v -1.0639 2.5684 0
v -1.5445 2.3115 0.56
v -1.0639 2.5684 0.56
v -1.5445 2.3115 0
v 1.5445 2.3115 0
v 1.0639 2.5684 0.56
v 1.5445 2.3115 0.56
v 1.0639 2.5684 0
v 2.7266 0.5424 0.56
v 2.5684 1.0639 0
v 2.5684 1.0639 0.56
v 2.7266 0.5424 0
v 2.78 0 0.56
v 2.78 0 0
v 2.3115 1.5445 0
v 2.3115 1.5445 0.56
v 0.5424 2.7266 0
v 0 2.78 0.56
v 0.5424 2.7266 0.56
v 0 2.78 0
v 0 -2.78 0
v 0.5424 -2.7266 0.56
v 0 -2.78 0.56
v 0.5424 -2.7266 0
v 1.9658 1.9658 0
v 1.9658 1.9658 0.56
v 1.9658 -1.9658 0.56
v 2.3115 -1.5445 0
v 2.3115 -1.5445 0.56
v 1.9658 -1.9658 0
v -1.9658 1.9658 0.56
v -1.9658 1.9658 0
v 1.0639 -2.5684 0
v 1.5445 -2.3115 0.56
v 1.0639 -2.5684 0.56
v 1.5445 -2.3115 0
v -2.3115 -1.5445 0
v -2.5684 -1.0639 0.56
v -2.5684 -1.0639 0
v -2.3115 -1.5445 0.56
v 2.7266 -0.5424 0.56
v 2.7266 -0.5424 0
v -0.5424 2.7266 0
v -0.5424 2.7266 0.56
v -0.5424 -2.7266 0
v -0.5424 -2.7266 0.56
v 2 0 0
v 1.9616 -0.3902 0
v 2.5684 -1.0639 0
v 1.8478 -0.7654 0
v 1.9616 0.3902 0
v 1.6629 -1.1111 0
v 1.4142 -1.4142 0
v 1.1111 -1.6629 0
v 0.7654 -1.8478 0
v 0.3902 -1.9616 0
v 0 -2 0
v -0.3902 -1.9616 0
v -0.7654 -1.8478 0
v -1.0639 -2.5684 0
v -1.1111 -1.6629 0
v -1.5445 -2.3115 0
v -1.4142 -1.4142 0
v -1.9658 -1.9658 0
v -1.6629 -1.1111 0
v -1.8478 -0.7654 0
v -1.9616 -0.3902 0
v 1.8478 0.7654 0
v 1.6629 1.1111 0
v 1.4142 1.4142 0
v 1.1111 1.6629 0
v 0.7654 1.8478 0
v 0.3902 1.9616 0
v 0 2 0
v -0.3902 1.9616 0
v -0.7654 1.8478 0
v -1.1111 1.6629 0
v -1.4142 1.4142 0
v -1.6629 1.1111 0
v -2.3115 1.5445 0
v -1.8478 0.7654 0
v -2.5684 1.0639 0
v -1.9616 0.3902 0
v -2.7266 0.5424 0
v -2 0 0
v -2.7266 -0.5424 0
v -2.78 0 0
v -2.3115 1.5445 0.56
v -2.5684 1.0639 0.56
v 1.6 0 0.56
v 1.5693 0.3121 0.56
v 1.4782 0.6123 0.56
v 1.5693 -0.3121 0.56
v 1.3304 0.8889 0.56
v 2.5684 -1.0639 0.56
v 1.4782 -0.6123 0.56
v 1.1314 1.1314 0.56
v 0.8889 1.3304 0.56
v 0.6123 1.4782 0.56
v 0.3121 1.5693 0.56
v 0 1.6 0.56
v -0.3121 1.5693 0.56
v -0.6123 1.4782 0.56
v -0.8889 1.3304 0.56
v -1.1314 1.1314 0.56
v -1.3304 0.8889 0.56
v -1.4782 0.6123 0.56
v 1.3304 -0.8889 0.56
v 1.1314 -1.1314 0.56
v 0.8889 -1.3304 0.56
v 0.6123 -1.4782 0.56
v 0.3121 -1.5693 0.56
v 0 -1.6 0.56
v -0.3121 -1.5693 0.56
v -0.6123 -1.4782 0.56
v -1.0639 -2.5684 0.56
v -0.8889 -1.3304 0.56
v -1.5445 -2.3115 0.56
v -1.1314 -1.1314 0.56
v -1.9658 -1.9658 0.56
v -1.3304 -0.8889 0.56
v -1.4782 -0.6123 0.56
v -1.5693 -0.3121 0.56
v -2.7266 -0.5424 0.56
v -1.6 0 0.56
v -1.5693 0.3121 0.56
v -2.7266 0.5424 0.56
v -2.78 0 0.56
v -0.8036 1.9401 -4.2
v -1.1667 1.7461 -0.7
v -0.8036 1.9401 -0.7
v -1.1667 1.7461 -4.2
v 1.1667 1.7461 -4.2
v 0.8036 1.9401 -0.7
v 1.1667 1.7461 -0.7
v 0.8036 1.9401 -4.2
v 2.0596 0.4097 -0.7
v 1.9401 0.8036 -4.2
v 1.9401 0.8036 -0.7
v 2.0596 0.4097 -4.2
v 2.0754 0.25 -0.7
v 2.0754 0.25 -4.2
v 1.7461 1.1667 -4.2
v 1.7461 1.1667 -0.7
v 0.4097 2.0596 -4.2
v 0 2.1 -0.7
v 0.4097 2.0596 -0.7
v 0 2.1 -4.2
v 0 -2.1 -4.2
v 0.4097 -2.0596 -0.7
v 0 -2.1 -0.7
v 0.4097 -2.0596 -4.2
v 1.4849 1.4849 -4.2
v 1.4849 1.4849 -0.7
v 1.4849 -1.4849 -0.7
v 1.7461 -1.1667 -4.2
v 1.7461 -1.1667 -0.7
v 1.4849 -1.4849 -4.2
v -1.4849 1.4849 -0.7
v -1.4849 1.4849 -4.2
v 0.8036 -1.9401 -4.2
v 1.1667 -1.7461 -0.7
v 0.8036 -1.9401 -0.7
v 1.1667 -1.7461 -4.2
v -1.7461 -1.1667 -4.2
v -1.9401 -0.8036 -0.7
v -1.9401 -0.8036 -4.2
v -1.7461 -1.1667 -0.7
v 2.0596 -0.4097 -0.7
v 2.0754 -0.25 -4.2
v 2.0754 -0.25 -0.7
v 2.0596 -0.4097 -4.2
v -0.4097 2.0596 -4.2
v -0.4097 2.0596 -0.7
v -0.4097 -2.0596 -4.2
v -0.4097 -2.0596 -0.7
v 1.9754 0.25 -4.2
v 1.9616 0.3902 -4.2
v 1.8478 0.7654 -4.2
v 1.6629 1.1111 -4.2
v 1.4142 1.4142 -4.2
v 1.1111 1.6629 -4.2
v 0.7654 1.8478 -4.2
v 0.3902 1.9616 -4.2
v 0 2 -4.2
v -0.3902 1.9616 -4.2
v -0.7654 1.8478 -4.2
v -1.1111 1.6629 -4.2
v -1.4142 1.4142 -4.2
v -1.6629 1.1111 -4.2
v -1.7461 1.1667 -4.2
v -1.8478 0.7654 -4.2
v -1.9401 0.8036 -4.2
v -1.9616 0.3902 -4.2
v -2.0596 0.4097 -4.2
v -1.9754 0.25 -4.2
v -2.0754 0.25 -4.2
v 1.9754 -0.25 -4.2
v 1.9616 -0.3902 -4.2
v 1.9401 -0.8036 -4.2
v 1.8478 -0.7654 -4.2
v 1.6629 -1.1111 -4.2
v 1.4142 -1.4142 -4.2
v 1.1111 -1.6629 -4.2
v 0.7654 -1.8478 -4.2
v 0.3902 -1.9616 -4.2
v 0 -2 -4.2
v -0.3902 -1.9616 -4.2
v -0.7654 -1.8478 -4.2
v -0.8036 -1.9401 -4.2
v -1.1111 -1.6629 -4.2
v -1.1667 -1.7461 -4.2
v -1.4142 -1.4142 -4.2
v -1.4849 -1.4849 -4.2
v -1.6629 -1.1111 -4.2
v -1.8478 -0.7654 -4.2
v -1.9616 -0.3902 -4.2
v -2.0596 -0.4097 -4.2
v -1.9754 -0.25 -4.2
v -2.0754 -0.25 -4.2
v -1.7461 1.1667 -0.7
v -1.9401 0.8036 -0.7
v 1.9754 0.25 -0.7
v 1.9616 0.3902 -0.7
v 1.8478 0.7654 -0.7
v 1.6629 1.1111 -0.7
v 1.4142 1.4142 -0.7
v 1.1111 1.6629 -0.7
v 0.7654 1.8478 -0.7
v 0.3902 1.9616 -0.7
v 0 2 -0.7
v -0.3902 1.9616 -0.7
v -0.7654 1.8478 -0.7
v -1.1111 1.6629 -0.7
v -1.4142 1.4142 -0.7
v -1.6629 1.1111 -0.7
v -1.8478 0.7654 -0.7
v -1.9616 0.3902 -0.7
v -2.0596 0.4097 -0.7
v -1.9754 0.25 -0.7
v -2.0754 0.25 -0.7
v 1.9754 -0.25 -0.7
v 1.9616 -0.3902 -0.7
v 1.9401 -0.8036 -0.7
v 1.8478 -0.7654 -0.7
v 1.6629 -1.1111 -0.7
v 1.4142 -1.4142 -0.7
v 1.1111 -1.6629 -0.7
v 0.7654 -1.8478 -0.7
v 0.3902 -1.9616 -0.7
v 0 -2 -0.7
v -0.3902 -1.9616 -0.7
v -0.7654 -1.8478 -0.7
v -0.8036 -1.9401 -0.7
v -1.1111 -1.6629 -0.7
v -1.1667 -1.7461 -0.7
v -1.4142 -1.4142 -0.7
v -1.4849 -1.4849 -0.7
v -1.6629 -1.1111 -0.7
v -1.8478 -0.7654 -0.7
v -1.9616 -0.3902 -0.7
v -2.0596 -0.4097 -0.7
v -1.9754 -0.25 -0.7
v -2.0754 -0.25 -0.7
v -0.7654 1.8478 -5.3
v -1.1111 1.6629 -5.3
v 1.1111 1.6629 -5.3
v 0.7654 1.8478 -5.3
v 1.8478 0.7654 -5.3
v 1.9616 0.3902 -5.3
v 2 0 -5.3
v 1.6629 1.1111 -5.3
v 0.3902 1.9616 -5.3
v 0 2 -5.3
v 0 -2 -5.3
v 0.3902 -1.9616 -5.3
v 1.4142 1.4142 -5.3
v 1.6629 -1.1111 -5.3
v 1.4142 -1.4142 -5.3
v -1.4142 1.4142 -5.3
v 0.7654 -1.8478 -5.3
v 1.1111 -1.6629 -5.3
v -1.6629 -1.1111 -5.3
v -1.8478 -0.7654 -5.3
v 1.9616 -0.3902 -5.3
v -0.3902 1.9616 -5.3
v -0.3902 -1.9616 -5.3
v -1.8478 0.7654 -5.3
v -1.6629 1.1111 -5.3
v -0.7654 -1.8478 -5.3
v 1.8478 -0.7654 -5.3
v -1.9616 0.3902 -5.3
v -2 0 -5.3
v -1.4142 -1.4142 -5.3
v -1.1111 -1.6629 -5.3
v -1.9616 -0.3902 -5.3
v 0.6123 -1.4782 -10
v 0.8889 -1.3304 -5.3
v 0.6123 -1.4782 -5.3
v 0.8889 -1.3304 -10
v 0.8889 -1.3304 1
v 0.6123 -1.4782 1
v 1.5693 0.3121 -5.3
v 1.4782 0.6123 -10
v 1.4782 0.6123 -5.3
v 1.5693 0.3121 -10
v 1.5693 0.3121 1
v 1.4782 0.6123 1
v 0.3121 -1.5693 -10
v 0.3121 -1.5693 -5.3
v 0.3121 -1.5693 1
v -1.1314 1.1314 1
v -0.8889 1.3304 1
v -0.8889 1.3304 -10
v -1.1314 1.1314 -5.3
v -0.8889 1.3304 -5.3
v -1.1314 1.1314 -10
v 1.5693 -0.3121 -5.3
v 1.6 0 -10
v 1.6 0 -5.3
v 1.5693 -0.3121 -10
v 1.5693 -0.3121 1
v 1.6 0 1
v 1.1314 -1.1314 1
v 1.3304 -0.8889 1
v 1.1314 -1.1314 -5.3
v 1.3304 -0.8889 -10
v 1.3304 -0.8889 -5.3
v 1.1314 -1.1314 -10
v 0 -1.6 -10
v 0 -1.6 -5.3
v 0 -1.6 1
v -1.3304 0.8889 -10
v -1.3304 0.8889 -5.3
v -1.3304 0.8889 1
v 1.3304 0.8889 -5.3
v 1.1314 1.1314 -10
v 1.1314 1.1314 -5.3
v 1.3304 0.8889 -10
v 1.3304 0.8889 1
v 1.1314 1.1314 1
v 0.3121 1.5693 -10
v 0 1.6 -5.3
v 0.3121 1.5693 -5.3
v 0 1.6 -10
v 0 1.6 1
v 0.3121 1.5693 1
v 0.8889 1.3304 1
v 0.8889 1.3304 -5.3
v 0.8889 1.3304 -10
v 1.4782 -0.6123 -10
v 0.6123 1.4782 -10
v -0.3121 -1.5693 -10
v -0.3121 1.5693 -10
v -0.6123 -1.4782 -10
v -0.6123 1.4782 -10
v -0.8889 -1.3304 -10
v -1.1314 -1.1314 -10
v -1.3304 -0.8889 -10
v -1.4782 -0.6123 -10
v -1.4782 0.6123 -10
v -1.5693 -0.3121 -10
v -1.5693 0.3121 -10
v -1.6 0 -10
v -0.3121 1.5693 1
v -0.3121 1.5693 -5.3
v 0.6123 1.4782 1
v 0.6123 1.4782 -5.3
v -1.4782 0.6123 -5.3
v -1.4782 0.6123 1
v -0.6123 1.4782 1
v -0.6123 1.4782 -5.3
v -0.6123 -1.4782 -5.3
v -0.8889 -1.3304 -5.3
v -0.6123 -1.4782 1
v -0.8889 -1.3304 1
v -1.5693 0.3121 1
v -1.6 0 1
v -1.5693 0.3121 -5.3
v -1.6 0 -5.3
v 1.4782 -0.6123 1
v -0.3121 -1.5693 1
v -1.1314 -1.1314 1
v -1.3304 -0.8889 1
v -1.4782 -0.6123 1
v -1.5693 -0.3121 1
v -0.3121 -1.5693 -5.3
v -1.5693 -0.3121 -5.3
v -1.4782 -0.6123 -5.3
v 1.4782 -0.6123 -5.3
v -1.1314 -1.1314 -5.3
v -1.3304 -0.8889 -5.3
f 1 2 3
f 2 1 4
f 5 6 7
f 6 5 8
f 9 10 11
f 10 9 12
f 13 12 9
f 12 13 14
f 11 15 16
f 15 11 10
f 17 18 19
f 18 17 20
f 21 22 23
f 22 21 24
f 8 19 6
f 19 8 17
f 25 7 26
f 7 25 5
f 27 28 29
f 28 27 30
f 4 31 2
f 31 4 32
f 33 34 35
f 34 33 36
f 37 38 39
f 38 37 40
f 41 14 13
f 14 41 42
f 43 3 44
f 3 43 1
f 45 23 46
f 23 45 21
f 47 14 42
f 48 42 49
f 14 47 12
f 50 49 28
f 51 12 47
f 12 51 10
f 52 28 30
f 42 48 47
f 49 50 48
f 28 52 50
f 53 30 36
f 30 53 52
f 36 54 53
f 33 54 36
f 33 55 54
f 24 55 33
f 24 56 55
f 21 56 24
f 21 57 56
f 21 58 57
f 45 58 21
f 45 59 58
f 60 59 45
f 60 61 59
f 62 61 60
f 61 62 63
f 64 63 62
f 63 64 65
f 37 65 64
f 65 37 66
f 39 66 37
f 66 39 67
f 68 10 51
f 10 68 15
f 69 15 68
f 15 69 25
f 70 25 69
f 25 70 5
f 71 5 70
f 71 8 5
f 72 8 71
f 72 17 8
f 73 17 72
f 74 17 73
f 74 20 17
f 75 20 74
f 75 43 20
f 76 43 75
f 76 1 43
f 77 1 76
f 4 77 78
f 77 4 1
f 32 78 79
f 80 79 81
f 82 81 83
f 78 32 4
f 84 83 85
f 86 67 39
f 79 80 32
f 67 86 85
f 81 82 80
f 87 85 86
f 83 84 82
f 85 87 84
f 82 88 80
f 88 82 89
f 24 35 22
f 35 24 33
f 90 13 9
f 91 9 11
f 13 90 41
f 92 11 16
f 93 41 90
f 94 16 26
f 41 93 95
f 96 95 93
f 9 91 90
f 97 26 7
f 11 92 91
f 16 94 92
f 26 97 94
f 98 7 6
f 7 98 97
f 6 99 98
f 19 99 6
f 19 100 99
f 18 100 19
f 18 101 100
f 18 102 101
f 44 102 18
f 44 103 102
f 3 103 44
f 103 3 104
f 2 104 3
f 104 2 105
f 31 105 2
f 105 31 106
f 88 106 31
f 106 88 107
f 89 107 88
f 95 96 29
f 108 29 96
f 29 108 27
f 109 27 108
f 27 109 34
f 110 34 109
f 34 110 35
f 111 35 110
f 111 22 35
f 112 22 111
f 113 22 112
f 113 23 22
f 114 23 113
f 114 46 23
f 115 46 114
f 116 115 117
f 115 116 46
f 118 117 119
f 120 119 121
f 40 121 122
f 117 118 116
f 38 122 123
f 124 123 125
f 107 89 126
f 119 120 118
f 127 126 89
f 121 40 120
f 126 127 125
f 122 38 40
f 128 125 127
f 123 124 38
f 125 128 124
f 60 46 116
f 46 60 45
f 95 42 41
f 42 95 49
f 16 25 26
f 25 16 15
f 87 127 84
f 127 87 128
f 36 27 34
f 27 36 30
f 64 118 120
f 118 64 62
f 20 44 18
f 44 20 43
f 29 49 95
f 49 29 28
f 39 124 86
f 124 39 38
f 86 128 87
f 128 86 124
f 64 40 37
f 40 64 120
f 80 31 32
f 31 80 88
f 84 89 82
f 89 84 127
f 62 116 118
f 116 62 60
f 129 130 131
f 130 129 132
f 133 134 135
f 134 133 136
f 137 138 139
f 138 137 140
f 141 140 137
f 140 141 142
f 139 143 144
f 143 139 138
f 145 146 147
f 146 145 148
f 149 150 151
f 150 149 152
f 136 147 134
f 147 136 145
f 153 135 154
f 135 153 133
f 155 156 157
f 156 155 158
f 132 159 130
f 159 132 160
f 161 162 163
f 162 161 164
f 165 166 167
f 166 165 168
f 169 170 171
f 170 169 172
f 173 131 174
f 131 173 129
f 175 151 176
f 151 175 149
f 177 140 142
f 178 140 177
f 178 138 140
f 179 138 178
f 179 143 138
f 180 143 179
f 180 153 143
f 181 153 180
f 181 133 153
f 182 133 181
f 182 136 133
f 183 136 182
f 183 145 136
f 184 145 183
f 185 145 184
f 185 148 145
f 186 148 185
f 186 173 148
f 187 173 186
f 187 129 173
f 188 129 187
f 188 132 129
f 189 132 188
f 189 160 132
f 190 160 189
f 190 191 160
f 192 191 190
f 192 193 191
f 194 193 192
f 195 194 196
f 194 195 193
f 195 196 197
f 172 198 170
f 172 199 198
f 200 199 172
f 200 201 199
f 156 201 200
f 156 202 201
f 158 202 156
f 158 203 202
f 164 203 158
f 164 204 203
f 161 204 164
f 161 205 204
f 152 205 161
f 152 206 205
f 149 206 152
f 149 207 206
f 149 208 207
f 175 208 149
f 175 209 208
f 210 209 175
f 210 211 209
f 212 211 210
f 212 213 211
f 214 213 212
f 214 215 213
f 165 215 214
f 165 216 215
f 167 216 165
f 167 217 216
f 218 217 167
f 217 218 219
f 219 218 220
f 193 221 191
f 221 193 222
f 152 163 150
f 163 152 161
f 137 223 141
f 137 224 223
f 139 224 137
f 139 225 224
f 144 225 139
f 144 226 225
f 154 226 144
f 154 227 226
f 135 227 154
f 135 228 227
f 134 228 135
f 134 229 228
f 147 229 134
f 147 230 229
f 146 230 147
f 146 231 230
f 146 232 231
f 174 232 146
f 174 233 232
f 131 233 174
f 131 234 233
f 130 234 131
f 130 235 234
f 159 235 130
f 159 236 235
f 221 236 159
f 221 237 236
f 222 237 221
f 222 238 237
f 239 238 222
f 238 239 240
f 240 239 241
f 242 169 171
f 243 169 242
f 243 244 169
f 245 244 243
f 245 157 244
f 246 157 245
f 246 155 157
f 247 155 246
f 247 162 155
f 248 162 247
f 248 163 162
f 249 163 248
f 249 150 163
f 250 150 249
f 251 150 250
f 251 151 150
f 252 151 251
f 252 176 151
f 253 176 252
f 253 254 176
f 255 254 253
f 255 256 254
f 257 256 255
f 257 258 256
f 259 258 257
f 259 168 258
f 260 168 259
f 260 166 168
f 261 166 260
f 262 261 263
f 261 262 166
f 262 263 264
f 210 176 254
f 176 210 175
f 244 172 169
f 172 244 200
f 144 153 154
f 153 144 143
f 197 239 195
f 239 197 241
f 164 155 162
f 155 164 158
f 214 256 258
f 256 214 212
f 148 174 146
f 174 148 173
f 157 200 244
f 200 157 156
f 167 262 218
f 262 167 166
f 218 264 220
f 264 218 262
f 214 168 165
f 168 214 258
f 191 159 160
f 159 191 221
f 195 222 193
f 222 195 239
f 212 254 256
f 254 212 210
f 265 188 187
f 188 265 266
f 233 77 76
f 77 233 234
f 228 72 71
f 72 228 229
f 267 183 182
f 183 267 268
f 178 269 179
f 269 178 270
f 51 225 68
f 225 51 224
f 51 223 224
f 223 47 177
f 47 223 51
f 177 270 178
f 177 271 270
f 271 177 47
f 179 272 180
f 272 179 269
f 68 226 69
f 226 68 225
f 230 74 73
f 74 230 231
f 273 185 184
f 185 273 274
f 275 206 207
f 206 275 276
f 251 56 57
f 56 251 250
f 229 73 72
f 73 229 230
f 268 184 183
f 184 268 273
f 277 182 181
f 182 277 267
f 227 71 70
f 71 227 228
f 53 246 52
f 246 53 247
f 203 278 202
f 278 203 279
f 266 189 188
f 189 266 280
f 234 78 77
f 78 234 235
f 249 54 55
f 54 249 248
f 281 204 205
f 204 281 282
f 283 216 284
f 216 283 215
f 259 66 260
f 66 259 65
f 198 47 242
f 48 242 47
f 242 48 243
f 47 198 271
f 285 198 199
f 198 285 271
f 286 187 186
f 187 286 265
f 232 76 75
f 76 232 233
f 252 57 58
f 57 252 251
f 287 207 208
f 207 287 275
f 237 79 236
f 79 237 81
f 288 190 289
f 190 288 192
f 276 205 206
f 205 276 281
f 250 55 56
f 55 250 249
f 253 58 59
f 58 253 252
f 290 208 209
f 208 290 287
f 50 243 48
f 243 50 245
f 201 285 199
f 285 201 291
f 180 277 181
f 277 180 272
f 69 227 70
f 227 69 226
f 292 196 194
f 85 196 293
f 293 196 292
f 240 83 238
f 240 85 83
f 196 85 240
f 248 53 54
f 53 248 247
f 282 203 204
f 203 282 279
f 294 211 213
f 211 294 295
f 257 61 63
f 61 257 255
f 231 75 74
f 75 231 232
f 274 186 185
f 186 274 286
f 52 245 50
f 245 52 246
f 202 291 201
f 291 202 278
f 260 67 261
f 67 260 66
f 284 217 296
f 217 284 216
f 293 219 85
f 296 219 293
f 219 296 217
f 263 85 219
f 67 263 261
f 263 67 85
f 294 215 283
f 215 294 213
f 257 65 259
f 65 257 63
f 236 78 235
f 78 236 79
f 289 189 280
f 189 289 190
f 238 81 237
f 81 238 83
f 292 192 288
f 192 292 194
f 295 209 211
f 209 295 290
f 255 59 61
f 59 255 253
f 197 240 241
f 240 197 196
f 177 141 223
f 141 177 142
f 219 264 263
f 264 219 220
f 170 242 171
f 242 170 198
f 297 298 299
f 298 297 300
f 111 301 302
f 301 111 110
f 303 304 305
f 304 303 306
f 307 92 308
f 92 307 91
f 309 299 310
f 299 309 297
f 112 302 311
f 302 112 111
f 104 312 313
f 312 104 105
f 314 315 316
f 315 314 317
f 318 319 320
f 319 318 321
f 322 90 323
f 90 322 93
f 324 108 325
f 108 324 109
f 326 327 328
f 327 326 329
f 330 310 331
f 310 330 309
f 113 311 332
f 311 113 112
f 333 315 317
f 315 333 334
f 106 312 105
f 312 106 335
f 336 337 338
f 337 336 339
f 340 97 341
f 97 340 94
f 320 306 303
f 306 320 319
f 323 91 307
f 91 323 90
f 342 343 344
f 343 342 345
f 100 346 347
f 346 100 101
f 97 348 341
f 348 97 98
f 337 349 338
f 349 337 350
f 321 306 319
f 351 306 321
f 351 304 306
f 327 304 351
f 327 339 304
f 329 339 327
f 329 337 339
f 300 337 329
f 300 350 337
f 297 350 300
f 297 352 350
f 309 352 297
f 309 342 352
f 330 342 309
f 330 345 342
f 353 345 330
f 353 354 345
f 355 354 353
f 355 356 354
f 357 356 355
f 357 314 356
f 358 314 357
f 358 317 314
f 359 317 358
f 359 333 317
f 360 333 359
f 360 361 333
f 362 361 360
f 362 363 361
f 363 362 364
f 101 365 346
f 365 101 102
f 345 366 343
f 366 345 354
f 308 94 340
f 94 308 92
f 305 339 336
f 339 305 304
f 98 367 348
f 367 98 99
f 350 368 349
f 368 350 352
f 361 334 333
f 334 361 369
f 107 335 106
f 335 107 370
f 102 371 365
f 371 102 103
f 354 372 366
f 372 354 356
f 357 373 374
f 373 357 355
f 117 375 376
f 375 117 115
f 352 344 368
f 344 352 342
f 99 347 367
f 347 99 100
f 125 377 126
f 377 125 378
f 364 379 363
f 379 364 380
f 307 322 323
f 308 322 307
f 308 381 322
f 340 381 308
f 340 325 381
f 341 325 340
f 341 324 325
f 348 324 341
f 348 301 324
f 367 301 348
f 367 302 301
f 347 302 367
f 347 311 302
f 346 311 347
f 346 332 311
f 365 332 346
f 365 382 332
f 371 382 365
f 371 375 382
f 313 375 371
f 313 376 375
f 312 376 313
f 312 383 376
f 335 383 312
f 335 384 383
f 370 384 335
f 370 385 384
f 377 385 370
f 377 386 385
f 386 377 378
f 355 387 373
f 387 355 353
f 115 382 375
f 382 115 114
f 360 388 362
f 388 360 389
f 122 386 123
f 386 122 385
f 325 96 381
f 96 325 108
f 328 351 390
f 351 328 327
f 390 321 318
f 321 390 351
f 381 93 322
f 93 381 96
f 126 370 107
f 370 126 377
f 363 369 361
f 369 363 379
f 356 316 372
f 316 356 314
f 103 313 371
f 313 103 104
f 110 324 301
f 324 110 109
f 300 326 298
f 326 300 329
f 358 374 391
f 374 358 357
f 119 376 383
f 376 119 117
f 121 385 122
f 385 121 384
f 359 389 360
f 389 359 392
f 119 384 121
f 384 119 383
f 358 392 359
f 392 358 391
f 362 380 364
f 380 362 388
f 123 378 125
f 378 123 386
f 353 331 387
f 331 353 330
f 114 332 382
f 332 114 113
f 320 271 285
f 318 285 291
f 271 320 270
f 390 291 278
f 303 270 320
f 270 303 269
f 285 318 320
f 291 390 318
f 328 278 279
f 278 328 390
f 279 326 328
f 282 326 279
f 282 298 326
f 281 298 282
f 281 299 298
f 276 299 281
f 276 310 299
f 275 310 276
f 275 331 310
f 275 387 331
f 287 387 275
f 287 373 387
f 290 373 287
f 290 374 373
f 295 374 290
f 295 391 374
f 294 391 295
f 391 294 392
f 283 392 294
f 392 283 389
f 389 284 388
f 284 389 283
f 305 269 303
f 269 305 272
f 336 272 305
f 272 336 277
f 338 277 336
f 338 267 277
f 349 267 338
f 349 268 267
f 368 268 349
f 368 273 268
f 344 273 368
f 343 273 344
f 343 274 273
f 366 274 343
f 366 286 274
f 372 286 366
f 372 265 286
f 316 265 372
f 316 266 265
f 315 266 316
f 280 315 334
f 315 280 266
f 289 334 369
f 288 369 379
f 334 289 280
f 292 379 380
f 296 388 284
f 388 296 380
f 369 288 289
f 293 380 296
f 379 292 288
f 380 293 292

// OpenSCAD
/**
 * Martin Egli
 * 2021-11-01
 * M3 screw cut outs
 */

module m3ScrewCut(len = 10, cut_d = 3.2, loc_res = 32) {
    translate([0, 0, 0])
    cylinder(d = cut_d, h = len, $fn = loc_res);
}
*m3ScrewCut();

module m3SinkHeadCut(len = 4, loc_res = 32) {
    translate([0, 0, 0])
    cylinder(d1 = 3.2, d2 = 6.6, h = 2, $fn = loc_res);
    translate([0, 0, 2])
    cylinder(d = 6.6, h = len, $fn = loc_res);
}
module m3CylinderHeadCut(len = 4, loc_res = 32) {
    translate([0, 0, 0])
    cylinder(d = 6, h = len, $fn = loc_res);
}

module m3ScrewSinkHeadCut(len = 4, loc_res = 32) {
    translate([0, 0, 0])
    m3ScrewCut(len, loc_res);
    translate([0, 0, len])
    m3SinkHeadCut(len, loc_res);
}

module m3NutCut() {
    translate([0, 0, 0])
    cylinder(d = 6.7, h = 4, $fn = 6);
}
*m3NutCut();

module m3SinkHeadScewNutCut(len = 10, loc_res = 32) {
    translate([0, 0, len])
    m3SinkHeadCut(4, loc_res);
    m3ScrewCut(len+1, loc_res);
    m3NutCut();
}

module m3CylinderHeadScewNutCut(len = 10, loc_res = 32) {
    translate([0, 0, len])
    m3CylinderHeadCut(4, loc_res);
    m3ScrewCut(len+1, loc_res);
    m3NutCut();
}

*m3SinkHeadScewNutCut(20);
*m3CylinderHeadScewNutCut(15);
*m3ScrewSinkHeadCut(10);

// M3 press-fit insert "PFLA-M3-1"
module pfla_m3_1_insert(len = 10, m3_dia = 3.2, loc_res = 32) {
    difference() {
        union() {
            cylinder(d = 5.56, h = 0.56, $fn = loc_res);
            translate([0, 0, -4.2])
            cylinder(d = 4.2, h = 3.5, $fn = loc_res);
            translate([0, 0, -4.2])
            cylinder(d = 4, h = 4.2, $fn = loc_res);
        }
        // m3 thread
        translate([0, 0, -4.5])
        cylinder(d = 3, h = 6, $fn = loc_res);
        // cut
        translate([-5/2, -0.5/2, -4.3])
        cube([5, 0.5, 3.6]);
    }
}

pfla_m3_1_insert();

module pfla_m3_1_insert_cut(len = 10, m3_dia = 3.2, loc_res = 32) {
    // m3 cut
    translate([0, 0, -(len)])
    cylinder(d = m3_dia, h = len+1, $fn = loc_res);
    // insert cut
    translate([0, 0, -5.3])
    cylinder(d = 4, h = 5.3, $fn = loc_res); // cut dia: 3.96mm, cut depth: 5.24 mm
}

pfla_m3_1_insert_cut();

module pfla_m3_cut(len = 10, m3_dia = 3.2, loc_res = 32) {
    // only m3 cut
    translate([0, 0, -(len)])
    cylinder(d = m3_dia, h = len+1, $fn = loc_res);
}
pfla_m3_cut();
